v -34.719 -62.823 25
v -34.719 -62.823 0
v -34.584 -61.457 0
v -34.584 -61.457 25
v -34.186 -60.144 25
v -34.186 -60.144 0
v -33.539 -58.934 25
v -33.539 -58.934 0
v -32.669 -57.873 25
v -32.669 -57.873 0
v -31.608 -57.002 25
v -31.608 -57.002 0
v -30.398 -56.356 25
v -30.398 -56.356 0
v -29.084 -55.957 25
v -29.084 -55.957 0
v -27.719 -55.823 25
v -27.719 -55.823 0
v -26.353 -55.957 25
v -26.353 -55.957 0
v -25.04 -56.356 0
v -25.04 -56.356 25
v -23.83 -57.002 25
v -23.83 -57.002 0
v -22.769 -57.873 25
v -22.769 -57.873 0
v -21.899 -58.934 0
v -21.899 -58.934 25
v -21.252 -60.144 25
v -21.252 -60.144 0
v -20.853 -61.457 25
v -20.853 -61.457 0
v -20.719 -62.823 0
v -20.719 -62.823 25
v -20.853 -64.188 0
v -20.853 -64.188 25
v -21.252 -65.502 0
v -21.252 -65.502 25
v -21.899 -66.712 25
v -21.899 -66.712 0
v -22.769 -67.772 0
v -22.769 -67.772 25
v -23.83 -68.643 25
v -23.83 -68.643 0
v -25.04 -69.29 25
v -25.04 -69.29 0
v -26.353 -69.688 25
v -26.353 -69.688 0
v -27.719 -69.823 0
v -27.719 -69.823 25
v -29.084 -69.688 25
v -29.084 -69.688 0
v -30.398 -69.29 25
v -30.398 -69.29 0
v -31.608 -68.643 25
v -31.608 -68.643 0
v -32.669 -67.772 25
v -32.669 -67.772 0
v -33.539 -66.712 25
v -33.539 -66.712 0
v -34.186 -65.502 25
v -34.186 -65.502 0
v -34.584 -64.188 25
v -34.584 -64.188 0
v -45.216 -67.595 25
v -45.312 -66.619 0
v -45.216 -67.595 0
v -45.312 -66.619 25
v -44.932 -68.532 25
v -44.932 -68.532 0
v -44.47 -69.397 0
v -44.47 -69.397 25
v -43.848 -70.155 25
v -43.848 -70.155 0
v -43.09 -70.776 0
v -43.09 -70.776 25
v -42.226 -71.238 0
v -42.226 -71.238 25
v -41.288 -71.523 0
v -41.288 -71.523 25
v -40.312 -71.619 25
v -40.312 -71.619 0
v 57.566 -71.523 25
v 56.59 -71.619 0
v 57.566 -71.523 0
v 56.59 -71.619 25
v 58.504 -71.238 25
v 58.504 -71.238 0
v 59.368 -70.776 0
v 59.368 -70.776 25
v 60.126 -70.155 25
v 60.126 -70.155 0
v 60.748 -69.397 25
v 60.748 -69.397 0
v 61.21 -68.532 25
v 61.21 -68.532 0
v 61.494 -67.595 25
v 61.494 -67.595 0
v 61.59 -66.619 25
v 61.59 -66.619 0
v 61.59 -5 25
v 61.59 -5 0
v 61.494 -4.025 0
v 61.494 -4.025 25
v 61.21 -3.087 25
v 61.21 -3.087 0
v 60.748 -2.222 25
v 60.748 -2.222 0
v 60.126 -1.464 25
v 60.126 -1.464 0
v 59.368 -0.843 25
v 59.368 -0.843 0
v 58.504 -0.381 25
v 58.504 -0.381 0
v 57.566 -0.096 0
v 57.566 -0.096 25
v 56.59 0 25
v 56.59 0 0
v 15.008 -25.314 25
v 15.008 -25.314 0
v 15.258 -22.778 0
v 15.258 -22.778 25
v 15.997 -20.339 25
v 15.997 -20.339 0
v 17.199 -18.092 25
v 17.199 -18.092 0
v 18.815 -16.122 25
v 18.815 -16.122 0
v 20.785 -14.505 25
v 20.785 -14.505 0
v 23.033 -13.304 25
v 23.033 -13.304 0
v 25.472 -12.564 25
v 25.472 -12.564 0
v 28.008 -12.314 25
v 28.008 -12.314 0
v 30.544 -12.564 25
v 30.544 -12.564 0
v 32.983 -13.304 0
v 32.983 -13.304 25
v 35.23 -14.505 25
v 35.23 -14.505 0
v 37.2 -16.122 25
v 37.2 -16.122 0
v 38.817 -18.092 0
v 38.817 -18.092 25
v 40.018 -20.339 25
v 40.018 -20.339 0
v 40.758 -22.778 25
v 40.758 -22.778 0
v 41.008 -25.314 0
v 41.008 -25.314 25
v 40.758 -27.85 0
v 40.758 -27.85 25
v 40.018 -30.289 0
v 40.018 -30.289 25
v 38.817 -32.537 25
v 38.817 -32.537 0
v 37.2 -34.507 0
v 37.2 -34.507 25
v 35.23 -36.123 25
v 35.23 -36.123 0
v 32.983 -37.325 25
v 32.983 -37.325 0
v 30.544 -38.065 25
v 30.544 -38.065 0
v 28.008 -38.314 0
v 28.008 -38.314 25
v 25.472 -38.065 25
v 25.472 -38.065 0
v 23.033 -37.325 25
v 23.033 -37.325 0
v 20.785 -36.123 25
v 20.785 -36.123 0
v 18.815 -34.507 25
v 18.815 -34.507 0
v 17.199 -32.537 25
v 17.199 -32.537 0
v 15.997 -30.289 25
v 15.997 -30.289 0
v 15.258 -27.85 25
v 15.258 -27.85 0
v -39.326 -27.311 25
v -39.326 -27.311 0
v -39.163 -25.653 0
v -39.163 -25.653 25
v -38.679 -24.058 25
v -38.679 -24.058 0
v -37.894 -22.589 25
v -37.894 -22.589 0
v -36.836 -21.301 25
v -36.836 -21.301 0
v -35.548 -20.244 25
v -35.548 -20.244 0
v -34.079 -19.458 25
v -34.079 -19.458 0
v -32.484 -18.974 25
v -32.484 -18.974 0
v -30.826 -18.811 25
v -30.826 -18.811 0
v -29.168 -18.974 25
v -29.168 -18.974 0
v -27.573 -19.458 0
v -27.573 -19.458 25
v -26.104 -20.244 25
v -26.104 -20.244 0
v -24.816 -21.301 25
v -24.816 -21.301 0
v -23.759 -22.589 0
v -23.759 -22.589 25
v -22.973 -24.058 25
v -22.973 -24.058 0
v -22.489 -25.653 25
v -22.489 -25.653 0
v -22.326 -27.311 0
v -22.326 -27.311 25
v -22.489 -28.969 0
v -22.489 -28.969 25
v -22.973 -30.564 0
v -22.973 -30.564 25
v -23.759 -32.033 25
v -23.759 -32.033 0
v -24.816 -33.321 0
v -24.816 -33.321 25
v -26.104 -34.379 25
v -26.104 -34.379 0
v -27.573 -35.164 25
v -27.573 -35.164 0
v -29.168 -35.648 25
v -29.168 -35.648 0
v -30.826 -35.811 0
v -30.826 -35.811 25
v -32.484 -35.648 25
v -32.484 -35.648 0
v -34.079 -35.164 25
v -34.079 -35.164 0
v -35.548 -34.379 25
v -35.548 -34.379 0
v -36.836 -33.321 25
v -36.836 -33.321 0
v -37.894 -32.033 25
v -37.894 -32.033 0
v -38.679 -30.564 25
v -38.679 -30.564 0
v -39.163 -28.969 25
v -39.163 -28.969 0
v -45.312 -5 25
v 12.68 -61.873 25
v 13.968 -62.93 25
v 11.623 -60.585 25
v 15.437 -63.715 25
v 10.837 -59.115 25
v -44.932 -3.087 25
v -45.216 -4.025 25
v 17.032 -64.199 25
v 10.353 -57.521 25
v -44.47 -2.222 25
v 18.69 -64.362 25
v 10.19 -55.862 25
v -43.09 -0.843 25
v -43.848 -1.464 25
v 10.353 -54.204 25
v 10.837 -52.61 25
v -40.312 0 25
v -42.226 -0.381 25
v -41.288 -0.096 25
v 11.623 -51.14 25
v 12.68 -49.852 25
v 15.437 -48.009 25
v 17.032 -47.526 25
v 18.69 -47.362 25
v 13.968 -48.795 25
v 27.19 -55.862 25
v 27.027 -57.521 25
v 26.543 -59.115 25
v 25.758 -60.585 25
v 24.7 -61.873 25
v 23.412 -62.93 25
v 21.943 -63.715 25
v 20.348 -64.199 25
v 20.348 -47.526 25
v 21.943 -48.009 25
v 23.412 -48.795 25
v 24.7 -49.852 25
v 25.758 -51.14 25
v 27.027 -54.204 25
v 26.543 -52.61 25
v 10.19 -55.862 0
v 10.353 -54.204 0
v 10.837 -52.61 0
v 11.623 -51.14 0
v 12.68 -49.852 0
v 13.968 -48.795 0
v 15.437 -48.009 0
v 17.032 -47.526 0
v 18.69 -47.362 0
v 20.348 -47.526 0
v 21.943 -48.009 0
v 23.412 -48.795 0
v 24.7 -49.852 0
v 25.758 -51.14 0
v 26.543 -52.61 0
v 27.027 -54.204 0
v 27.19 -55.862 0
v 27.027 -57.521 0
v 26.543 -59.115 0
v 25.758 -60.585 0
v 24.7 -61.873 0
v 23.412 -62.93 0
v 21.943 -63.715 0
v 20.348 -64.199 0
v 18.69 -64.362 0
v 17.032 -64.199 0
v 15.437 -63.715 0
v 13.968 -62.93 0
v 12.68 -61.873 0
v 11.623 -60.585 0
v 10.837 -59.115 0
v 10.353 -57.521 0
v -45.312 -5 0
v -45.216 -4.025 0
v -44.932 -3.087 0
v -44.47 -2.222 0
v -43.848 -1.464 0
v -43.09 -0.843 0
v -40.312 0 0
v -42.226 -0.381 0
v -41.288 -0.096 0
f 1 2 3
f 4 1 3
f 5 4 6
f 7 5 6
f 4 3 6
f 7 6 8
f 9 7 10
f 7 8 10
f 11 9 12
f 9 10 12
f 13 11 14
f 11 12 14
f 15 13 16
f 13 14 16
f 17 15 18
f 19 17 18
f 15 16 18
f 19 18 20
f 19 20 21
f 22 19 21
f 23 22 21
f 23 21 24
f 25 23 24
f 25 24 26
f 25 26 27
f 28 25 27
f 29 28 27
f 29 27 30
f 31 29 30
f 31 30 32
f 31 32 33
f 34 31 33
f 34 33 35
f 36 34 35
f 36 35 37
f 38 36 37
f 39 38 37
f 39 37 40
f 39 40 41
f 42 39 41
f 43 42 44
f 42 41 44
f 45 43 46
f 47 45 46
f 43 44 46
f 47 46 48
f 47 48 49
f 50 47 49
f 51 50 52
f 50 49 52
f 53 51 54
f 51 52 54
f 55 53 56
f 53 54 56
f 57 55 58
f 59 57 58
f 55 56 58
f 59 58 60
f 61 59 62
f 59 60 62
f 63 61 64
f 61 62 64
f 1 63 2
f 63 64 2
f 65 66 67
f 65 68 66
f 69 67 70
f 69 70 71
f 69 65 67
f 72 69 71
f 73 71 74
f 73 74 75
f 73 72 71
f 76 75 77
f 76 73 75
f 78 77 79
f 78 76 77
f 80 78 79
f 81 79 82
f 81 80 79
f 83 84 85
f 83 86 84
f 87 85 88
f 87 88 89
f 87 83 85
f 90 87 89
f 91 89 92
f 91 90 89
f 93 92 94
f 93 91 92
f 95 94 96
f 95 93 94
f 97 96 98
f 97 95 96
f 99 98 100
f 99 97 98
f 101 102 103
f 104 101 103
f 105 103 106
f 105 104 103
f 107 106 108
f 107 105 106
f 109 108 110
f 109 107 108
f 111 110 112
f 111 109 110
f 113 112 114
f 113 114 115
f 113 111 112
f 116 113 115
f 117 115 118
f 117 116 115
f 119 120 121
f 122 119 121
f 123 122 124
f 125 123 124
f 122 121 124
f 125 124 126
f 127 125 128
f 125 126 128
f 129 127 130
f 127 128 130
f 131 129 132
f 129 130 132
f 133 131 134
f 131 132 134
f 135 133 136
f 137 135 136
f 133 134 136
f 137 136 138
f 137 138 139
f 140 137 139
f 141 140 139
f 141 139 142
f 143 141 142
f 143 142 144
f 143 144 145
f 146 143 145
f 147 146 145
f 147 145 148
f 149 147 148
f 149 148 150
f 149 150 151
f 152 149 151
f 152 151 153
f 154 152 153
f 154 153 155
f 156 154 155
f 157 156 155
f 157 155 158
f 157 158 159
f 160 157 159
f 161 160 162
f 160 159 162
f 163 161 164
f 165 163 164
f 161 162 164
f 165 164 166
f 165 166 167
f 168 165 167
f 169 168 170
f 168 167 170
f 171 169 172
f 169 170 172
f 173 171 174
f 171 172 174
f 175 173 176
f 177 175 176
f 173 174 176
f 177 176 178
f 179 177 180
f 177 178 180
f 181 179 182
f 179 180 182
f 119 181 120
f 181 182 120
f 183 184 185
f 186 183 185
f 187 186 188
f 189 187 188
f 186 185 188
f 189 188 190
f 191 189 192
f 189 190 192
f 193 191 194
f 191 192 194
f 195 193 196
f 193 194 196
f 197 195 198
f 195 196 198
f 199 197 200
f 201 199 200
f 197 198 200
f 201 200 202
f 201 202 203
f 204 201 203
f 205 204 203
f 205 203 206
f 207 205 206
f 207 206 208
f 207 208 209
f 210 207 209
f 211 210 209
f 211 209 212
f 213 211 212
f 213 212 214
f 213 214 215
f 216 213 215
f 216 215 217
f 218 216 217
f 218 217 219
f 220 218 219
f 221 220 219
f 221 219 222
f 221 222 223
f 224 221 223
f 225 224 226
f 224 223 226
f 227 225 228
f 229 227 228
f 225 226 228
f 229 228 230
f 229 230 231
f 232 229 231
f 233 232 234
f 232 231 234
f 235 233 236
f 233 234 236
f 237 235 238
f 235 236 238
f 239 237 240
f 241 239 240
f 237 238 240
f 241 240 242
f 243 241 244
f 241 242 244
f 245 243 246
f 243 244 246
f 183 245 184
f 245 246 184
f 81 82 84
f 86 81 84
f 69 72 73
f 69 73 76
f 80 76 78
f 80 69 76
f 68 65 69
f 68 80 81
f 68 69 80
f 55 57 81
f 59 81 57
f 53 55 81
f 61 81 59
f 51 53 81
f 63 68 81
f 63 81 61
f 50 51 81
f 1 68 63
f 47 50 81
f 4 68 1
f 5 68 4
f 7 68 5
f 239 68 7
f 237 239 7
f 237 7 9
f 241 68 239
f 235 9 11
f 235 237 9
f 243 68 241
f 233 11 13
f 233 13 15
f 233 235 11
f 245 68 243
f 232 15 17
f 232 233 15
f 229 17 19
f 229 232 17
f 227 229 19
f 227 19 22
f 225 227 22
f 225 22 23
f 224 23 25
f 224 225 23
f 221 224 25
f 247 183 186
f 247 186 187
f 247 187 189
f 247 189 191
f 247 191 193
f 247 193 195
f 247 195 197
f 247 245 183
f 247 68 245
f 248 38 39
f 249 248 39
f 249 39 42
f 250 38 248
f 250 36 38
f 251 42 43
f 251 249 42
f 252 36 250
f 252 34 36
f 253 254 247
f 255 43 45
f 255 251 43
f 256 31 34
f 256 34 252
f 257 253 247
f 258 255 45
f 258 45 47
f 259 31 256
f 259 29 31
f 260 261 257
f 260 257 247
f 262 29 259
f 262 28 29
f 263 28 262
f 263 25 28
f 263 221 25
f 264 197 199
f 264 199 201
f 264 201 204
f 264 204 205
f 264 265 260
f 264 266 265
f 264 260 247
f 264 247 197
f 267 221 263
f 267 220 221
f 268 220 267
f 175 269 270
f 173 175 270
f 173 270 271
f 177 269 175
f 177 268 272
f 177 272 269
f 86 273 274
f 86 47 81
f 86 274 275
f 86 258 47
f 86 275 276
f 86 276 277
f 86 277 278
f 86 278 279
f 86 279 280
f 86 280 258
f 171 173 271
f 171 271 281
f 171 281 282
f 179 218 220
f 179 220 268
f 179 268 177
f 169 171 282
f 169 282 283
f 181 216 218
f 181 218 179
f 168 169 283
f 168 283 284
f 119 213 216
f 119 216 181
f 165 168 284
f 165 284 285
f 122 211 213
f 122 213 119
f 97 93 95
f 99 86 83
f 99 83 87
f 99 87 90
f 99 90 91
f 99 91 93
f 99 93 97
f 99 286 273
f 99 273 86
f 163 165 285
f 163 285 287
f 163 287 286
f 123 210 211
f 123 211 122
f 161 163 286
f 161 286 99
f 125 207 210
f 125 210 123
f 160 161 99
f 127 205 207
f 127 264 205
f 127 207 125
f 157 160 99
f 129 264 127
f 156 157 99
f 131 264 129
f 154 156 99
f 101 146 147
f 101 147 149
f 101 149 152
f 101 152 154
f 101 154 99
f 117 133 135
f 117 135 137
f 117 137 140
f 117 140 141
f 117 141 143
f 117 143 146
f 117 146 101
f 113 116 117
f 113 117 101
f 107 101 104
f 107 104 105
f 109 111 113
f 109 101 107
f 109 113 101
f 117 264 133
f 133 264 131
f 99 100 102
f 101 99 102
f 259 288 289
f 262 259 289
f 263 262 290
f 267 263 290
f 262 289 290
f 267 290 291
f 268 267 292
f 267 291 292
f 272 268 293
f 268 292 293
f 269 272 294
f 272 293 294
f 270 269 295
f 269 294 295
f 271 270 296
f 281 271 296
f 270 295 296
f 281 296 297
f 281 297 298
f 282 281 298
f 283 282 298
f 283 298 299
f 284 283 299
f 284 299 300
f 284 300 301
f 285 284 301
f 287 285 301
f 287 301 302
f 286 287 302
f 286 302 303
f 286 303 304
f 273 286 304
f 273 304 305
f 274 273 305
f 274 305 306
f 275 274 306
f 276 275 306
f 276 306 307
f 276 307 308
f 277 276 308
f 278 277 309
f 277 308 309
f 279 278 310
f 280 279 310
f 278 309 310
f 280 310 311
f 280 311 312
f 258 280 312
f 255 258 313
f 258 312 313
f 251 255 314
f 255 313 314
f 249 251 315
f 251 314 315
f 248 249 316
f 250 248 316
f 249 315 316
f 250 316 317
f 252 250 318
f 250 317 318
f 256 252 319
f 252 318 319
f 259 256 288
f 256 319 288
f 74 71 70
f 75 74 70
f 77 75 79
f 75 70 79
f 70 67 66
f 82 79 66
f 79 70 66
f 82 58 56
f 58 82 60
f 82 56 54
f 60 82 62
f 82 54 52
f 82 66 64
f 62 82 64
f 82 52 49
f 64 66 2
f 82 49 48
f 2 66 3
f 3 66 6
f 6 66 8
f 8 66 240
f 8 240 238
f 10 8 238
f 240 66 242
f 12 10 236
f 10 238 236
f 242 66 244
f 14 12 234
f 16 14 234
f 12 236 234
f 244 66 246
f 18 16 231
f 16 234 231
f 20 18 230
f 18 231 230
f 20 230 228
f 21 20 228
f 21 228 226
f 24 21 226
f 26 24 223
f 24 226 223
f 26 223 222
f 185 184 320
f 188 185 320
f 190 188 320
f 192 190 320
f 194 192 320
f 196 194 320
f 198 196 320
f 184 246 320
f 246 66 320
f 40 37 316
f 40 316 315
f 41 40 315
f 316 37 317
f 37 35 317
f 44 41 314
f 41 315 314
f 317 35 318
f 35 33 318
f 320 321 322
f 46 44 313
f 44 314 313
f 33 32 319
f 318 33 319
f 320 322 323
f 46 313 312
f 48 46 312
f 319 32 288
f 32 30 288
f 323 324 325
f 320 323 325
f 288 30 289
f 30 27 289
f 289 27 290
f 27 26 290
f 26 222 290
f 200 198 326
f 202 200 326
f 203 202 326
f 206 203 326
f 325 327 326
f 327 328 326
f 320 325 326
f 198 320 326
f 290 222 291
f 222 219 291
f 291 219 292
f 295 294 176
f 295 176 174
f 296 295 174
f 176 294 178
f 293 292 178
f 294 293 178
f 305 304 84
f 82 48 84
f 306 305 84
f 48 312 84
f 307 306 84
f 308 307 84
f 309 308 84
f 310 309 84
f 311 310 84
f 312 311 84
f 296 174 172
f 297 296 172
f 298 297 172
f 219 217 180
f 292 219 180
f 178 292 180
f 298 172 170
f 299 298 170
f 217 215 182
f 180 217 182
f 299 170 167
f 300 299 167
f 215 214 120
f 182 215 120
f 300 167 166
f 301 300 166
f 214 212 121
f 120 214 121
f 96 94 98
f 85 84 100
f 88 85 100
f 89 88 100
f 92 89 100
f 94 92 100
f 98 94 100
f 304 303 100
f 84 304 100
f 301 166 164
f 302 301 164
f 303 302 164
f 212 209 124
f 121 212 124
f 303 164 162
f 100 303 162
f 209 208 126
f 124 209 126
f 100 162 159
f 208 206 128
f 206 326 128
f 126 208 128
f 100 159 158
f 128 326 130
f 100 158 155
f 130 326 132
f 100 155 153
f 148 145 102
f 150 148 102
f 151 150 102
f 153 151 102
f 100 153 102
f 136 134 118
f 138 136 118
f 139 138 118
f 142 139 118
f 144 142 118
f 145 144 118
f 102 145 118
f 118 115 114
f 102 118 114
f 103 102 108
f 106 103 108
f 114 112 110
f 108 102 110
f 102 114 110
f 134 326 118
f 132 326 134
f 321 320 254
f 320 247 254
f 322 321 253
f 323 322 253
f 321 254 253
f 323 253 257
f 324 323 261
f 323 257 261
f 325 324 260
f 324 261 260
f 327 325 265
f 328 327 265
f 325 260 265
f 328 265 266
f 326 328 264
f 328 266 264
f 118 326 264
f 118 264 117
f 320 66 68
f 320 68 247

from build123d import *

# Parameters (mm, degrees)
F0_W     = 106.902622
F0_H     = 71.619071
F1_DEPTH = 25
F2_R     = 5
F4_D     = 14
F5_D     = 17
F6_D     = 17
F7_D     = 26


with BuildPart() as f1:
    # F0 (on Top) → F1 (new body)
    with BuildSketch(Plane.XY):
        with Locations((8.139081, -35.809535)):
            Rectangle(F0_W, F0_H)
    extrude(amount=F1_DEPTH)

    # F2
    f2_edges = [f1.edges().sort_by_distance(p)[0] for p in [
        (-45.31223, -71.619071, 12.5),
        (61.590392, -71.619071, 12.5),
        (61.590392, 0, 12.5),
        (-45.31223, 0, 12.5),
    ]]
    fillet(f2_edges, radius=F2_R)

    # F4 (through all)
    with Locations(Plane.XY.offset(25)):
        with Locations((-27.718794, -62.822722)):
            Hole(F4_D / 2)

    # F5 (through all)
    with Locations(Plane.XY.offset(25)):
        with Locations((-30.82606, -27.311074)):
            Hole(F5_D / 2)

    # F6 (through all)
    with Locations(Plane.XY.offset(25)):
        with Locations((18.690022, -55.862375)):
            Hole(F6_D / 2)

    # F7 (through all)
    with Locations(Plane.XY.offset(25)):
        with Locations((28.00785, -25.314316)):
            Hole(F7_D / 2)


solid = f1.part
